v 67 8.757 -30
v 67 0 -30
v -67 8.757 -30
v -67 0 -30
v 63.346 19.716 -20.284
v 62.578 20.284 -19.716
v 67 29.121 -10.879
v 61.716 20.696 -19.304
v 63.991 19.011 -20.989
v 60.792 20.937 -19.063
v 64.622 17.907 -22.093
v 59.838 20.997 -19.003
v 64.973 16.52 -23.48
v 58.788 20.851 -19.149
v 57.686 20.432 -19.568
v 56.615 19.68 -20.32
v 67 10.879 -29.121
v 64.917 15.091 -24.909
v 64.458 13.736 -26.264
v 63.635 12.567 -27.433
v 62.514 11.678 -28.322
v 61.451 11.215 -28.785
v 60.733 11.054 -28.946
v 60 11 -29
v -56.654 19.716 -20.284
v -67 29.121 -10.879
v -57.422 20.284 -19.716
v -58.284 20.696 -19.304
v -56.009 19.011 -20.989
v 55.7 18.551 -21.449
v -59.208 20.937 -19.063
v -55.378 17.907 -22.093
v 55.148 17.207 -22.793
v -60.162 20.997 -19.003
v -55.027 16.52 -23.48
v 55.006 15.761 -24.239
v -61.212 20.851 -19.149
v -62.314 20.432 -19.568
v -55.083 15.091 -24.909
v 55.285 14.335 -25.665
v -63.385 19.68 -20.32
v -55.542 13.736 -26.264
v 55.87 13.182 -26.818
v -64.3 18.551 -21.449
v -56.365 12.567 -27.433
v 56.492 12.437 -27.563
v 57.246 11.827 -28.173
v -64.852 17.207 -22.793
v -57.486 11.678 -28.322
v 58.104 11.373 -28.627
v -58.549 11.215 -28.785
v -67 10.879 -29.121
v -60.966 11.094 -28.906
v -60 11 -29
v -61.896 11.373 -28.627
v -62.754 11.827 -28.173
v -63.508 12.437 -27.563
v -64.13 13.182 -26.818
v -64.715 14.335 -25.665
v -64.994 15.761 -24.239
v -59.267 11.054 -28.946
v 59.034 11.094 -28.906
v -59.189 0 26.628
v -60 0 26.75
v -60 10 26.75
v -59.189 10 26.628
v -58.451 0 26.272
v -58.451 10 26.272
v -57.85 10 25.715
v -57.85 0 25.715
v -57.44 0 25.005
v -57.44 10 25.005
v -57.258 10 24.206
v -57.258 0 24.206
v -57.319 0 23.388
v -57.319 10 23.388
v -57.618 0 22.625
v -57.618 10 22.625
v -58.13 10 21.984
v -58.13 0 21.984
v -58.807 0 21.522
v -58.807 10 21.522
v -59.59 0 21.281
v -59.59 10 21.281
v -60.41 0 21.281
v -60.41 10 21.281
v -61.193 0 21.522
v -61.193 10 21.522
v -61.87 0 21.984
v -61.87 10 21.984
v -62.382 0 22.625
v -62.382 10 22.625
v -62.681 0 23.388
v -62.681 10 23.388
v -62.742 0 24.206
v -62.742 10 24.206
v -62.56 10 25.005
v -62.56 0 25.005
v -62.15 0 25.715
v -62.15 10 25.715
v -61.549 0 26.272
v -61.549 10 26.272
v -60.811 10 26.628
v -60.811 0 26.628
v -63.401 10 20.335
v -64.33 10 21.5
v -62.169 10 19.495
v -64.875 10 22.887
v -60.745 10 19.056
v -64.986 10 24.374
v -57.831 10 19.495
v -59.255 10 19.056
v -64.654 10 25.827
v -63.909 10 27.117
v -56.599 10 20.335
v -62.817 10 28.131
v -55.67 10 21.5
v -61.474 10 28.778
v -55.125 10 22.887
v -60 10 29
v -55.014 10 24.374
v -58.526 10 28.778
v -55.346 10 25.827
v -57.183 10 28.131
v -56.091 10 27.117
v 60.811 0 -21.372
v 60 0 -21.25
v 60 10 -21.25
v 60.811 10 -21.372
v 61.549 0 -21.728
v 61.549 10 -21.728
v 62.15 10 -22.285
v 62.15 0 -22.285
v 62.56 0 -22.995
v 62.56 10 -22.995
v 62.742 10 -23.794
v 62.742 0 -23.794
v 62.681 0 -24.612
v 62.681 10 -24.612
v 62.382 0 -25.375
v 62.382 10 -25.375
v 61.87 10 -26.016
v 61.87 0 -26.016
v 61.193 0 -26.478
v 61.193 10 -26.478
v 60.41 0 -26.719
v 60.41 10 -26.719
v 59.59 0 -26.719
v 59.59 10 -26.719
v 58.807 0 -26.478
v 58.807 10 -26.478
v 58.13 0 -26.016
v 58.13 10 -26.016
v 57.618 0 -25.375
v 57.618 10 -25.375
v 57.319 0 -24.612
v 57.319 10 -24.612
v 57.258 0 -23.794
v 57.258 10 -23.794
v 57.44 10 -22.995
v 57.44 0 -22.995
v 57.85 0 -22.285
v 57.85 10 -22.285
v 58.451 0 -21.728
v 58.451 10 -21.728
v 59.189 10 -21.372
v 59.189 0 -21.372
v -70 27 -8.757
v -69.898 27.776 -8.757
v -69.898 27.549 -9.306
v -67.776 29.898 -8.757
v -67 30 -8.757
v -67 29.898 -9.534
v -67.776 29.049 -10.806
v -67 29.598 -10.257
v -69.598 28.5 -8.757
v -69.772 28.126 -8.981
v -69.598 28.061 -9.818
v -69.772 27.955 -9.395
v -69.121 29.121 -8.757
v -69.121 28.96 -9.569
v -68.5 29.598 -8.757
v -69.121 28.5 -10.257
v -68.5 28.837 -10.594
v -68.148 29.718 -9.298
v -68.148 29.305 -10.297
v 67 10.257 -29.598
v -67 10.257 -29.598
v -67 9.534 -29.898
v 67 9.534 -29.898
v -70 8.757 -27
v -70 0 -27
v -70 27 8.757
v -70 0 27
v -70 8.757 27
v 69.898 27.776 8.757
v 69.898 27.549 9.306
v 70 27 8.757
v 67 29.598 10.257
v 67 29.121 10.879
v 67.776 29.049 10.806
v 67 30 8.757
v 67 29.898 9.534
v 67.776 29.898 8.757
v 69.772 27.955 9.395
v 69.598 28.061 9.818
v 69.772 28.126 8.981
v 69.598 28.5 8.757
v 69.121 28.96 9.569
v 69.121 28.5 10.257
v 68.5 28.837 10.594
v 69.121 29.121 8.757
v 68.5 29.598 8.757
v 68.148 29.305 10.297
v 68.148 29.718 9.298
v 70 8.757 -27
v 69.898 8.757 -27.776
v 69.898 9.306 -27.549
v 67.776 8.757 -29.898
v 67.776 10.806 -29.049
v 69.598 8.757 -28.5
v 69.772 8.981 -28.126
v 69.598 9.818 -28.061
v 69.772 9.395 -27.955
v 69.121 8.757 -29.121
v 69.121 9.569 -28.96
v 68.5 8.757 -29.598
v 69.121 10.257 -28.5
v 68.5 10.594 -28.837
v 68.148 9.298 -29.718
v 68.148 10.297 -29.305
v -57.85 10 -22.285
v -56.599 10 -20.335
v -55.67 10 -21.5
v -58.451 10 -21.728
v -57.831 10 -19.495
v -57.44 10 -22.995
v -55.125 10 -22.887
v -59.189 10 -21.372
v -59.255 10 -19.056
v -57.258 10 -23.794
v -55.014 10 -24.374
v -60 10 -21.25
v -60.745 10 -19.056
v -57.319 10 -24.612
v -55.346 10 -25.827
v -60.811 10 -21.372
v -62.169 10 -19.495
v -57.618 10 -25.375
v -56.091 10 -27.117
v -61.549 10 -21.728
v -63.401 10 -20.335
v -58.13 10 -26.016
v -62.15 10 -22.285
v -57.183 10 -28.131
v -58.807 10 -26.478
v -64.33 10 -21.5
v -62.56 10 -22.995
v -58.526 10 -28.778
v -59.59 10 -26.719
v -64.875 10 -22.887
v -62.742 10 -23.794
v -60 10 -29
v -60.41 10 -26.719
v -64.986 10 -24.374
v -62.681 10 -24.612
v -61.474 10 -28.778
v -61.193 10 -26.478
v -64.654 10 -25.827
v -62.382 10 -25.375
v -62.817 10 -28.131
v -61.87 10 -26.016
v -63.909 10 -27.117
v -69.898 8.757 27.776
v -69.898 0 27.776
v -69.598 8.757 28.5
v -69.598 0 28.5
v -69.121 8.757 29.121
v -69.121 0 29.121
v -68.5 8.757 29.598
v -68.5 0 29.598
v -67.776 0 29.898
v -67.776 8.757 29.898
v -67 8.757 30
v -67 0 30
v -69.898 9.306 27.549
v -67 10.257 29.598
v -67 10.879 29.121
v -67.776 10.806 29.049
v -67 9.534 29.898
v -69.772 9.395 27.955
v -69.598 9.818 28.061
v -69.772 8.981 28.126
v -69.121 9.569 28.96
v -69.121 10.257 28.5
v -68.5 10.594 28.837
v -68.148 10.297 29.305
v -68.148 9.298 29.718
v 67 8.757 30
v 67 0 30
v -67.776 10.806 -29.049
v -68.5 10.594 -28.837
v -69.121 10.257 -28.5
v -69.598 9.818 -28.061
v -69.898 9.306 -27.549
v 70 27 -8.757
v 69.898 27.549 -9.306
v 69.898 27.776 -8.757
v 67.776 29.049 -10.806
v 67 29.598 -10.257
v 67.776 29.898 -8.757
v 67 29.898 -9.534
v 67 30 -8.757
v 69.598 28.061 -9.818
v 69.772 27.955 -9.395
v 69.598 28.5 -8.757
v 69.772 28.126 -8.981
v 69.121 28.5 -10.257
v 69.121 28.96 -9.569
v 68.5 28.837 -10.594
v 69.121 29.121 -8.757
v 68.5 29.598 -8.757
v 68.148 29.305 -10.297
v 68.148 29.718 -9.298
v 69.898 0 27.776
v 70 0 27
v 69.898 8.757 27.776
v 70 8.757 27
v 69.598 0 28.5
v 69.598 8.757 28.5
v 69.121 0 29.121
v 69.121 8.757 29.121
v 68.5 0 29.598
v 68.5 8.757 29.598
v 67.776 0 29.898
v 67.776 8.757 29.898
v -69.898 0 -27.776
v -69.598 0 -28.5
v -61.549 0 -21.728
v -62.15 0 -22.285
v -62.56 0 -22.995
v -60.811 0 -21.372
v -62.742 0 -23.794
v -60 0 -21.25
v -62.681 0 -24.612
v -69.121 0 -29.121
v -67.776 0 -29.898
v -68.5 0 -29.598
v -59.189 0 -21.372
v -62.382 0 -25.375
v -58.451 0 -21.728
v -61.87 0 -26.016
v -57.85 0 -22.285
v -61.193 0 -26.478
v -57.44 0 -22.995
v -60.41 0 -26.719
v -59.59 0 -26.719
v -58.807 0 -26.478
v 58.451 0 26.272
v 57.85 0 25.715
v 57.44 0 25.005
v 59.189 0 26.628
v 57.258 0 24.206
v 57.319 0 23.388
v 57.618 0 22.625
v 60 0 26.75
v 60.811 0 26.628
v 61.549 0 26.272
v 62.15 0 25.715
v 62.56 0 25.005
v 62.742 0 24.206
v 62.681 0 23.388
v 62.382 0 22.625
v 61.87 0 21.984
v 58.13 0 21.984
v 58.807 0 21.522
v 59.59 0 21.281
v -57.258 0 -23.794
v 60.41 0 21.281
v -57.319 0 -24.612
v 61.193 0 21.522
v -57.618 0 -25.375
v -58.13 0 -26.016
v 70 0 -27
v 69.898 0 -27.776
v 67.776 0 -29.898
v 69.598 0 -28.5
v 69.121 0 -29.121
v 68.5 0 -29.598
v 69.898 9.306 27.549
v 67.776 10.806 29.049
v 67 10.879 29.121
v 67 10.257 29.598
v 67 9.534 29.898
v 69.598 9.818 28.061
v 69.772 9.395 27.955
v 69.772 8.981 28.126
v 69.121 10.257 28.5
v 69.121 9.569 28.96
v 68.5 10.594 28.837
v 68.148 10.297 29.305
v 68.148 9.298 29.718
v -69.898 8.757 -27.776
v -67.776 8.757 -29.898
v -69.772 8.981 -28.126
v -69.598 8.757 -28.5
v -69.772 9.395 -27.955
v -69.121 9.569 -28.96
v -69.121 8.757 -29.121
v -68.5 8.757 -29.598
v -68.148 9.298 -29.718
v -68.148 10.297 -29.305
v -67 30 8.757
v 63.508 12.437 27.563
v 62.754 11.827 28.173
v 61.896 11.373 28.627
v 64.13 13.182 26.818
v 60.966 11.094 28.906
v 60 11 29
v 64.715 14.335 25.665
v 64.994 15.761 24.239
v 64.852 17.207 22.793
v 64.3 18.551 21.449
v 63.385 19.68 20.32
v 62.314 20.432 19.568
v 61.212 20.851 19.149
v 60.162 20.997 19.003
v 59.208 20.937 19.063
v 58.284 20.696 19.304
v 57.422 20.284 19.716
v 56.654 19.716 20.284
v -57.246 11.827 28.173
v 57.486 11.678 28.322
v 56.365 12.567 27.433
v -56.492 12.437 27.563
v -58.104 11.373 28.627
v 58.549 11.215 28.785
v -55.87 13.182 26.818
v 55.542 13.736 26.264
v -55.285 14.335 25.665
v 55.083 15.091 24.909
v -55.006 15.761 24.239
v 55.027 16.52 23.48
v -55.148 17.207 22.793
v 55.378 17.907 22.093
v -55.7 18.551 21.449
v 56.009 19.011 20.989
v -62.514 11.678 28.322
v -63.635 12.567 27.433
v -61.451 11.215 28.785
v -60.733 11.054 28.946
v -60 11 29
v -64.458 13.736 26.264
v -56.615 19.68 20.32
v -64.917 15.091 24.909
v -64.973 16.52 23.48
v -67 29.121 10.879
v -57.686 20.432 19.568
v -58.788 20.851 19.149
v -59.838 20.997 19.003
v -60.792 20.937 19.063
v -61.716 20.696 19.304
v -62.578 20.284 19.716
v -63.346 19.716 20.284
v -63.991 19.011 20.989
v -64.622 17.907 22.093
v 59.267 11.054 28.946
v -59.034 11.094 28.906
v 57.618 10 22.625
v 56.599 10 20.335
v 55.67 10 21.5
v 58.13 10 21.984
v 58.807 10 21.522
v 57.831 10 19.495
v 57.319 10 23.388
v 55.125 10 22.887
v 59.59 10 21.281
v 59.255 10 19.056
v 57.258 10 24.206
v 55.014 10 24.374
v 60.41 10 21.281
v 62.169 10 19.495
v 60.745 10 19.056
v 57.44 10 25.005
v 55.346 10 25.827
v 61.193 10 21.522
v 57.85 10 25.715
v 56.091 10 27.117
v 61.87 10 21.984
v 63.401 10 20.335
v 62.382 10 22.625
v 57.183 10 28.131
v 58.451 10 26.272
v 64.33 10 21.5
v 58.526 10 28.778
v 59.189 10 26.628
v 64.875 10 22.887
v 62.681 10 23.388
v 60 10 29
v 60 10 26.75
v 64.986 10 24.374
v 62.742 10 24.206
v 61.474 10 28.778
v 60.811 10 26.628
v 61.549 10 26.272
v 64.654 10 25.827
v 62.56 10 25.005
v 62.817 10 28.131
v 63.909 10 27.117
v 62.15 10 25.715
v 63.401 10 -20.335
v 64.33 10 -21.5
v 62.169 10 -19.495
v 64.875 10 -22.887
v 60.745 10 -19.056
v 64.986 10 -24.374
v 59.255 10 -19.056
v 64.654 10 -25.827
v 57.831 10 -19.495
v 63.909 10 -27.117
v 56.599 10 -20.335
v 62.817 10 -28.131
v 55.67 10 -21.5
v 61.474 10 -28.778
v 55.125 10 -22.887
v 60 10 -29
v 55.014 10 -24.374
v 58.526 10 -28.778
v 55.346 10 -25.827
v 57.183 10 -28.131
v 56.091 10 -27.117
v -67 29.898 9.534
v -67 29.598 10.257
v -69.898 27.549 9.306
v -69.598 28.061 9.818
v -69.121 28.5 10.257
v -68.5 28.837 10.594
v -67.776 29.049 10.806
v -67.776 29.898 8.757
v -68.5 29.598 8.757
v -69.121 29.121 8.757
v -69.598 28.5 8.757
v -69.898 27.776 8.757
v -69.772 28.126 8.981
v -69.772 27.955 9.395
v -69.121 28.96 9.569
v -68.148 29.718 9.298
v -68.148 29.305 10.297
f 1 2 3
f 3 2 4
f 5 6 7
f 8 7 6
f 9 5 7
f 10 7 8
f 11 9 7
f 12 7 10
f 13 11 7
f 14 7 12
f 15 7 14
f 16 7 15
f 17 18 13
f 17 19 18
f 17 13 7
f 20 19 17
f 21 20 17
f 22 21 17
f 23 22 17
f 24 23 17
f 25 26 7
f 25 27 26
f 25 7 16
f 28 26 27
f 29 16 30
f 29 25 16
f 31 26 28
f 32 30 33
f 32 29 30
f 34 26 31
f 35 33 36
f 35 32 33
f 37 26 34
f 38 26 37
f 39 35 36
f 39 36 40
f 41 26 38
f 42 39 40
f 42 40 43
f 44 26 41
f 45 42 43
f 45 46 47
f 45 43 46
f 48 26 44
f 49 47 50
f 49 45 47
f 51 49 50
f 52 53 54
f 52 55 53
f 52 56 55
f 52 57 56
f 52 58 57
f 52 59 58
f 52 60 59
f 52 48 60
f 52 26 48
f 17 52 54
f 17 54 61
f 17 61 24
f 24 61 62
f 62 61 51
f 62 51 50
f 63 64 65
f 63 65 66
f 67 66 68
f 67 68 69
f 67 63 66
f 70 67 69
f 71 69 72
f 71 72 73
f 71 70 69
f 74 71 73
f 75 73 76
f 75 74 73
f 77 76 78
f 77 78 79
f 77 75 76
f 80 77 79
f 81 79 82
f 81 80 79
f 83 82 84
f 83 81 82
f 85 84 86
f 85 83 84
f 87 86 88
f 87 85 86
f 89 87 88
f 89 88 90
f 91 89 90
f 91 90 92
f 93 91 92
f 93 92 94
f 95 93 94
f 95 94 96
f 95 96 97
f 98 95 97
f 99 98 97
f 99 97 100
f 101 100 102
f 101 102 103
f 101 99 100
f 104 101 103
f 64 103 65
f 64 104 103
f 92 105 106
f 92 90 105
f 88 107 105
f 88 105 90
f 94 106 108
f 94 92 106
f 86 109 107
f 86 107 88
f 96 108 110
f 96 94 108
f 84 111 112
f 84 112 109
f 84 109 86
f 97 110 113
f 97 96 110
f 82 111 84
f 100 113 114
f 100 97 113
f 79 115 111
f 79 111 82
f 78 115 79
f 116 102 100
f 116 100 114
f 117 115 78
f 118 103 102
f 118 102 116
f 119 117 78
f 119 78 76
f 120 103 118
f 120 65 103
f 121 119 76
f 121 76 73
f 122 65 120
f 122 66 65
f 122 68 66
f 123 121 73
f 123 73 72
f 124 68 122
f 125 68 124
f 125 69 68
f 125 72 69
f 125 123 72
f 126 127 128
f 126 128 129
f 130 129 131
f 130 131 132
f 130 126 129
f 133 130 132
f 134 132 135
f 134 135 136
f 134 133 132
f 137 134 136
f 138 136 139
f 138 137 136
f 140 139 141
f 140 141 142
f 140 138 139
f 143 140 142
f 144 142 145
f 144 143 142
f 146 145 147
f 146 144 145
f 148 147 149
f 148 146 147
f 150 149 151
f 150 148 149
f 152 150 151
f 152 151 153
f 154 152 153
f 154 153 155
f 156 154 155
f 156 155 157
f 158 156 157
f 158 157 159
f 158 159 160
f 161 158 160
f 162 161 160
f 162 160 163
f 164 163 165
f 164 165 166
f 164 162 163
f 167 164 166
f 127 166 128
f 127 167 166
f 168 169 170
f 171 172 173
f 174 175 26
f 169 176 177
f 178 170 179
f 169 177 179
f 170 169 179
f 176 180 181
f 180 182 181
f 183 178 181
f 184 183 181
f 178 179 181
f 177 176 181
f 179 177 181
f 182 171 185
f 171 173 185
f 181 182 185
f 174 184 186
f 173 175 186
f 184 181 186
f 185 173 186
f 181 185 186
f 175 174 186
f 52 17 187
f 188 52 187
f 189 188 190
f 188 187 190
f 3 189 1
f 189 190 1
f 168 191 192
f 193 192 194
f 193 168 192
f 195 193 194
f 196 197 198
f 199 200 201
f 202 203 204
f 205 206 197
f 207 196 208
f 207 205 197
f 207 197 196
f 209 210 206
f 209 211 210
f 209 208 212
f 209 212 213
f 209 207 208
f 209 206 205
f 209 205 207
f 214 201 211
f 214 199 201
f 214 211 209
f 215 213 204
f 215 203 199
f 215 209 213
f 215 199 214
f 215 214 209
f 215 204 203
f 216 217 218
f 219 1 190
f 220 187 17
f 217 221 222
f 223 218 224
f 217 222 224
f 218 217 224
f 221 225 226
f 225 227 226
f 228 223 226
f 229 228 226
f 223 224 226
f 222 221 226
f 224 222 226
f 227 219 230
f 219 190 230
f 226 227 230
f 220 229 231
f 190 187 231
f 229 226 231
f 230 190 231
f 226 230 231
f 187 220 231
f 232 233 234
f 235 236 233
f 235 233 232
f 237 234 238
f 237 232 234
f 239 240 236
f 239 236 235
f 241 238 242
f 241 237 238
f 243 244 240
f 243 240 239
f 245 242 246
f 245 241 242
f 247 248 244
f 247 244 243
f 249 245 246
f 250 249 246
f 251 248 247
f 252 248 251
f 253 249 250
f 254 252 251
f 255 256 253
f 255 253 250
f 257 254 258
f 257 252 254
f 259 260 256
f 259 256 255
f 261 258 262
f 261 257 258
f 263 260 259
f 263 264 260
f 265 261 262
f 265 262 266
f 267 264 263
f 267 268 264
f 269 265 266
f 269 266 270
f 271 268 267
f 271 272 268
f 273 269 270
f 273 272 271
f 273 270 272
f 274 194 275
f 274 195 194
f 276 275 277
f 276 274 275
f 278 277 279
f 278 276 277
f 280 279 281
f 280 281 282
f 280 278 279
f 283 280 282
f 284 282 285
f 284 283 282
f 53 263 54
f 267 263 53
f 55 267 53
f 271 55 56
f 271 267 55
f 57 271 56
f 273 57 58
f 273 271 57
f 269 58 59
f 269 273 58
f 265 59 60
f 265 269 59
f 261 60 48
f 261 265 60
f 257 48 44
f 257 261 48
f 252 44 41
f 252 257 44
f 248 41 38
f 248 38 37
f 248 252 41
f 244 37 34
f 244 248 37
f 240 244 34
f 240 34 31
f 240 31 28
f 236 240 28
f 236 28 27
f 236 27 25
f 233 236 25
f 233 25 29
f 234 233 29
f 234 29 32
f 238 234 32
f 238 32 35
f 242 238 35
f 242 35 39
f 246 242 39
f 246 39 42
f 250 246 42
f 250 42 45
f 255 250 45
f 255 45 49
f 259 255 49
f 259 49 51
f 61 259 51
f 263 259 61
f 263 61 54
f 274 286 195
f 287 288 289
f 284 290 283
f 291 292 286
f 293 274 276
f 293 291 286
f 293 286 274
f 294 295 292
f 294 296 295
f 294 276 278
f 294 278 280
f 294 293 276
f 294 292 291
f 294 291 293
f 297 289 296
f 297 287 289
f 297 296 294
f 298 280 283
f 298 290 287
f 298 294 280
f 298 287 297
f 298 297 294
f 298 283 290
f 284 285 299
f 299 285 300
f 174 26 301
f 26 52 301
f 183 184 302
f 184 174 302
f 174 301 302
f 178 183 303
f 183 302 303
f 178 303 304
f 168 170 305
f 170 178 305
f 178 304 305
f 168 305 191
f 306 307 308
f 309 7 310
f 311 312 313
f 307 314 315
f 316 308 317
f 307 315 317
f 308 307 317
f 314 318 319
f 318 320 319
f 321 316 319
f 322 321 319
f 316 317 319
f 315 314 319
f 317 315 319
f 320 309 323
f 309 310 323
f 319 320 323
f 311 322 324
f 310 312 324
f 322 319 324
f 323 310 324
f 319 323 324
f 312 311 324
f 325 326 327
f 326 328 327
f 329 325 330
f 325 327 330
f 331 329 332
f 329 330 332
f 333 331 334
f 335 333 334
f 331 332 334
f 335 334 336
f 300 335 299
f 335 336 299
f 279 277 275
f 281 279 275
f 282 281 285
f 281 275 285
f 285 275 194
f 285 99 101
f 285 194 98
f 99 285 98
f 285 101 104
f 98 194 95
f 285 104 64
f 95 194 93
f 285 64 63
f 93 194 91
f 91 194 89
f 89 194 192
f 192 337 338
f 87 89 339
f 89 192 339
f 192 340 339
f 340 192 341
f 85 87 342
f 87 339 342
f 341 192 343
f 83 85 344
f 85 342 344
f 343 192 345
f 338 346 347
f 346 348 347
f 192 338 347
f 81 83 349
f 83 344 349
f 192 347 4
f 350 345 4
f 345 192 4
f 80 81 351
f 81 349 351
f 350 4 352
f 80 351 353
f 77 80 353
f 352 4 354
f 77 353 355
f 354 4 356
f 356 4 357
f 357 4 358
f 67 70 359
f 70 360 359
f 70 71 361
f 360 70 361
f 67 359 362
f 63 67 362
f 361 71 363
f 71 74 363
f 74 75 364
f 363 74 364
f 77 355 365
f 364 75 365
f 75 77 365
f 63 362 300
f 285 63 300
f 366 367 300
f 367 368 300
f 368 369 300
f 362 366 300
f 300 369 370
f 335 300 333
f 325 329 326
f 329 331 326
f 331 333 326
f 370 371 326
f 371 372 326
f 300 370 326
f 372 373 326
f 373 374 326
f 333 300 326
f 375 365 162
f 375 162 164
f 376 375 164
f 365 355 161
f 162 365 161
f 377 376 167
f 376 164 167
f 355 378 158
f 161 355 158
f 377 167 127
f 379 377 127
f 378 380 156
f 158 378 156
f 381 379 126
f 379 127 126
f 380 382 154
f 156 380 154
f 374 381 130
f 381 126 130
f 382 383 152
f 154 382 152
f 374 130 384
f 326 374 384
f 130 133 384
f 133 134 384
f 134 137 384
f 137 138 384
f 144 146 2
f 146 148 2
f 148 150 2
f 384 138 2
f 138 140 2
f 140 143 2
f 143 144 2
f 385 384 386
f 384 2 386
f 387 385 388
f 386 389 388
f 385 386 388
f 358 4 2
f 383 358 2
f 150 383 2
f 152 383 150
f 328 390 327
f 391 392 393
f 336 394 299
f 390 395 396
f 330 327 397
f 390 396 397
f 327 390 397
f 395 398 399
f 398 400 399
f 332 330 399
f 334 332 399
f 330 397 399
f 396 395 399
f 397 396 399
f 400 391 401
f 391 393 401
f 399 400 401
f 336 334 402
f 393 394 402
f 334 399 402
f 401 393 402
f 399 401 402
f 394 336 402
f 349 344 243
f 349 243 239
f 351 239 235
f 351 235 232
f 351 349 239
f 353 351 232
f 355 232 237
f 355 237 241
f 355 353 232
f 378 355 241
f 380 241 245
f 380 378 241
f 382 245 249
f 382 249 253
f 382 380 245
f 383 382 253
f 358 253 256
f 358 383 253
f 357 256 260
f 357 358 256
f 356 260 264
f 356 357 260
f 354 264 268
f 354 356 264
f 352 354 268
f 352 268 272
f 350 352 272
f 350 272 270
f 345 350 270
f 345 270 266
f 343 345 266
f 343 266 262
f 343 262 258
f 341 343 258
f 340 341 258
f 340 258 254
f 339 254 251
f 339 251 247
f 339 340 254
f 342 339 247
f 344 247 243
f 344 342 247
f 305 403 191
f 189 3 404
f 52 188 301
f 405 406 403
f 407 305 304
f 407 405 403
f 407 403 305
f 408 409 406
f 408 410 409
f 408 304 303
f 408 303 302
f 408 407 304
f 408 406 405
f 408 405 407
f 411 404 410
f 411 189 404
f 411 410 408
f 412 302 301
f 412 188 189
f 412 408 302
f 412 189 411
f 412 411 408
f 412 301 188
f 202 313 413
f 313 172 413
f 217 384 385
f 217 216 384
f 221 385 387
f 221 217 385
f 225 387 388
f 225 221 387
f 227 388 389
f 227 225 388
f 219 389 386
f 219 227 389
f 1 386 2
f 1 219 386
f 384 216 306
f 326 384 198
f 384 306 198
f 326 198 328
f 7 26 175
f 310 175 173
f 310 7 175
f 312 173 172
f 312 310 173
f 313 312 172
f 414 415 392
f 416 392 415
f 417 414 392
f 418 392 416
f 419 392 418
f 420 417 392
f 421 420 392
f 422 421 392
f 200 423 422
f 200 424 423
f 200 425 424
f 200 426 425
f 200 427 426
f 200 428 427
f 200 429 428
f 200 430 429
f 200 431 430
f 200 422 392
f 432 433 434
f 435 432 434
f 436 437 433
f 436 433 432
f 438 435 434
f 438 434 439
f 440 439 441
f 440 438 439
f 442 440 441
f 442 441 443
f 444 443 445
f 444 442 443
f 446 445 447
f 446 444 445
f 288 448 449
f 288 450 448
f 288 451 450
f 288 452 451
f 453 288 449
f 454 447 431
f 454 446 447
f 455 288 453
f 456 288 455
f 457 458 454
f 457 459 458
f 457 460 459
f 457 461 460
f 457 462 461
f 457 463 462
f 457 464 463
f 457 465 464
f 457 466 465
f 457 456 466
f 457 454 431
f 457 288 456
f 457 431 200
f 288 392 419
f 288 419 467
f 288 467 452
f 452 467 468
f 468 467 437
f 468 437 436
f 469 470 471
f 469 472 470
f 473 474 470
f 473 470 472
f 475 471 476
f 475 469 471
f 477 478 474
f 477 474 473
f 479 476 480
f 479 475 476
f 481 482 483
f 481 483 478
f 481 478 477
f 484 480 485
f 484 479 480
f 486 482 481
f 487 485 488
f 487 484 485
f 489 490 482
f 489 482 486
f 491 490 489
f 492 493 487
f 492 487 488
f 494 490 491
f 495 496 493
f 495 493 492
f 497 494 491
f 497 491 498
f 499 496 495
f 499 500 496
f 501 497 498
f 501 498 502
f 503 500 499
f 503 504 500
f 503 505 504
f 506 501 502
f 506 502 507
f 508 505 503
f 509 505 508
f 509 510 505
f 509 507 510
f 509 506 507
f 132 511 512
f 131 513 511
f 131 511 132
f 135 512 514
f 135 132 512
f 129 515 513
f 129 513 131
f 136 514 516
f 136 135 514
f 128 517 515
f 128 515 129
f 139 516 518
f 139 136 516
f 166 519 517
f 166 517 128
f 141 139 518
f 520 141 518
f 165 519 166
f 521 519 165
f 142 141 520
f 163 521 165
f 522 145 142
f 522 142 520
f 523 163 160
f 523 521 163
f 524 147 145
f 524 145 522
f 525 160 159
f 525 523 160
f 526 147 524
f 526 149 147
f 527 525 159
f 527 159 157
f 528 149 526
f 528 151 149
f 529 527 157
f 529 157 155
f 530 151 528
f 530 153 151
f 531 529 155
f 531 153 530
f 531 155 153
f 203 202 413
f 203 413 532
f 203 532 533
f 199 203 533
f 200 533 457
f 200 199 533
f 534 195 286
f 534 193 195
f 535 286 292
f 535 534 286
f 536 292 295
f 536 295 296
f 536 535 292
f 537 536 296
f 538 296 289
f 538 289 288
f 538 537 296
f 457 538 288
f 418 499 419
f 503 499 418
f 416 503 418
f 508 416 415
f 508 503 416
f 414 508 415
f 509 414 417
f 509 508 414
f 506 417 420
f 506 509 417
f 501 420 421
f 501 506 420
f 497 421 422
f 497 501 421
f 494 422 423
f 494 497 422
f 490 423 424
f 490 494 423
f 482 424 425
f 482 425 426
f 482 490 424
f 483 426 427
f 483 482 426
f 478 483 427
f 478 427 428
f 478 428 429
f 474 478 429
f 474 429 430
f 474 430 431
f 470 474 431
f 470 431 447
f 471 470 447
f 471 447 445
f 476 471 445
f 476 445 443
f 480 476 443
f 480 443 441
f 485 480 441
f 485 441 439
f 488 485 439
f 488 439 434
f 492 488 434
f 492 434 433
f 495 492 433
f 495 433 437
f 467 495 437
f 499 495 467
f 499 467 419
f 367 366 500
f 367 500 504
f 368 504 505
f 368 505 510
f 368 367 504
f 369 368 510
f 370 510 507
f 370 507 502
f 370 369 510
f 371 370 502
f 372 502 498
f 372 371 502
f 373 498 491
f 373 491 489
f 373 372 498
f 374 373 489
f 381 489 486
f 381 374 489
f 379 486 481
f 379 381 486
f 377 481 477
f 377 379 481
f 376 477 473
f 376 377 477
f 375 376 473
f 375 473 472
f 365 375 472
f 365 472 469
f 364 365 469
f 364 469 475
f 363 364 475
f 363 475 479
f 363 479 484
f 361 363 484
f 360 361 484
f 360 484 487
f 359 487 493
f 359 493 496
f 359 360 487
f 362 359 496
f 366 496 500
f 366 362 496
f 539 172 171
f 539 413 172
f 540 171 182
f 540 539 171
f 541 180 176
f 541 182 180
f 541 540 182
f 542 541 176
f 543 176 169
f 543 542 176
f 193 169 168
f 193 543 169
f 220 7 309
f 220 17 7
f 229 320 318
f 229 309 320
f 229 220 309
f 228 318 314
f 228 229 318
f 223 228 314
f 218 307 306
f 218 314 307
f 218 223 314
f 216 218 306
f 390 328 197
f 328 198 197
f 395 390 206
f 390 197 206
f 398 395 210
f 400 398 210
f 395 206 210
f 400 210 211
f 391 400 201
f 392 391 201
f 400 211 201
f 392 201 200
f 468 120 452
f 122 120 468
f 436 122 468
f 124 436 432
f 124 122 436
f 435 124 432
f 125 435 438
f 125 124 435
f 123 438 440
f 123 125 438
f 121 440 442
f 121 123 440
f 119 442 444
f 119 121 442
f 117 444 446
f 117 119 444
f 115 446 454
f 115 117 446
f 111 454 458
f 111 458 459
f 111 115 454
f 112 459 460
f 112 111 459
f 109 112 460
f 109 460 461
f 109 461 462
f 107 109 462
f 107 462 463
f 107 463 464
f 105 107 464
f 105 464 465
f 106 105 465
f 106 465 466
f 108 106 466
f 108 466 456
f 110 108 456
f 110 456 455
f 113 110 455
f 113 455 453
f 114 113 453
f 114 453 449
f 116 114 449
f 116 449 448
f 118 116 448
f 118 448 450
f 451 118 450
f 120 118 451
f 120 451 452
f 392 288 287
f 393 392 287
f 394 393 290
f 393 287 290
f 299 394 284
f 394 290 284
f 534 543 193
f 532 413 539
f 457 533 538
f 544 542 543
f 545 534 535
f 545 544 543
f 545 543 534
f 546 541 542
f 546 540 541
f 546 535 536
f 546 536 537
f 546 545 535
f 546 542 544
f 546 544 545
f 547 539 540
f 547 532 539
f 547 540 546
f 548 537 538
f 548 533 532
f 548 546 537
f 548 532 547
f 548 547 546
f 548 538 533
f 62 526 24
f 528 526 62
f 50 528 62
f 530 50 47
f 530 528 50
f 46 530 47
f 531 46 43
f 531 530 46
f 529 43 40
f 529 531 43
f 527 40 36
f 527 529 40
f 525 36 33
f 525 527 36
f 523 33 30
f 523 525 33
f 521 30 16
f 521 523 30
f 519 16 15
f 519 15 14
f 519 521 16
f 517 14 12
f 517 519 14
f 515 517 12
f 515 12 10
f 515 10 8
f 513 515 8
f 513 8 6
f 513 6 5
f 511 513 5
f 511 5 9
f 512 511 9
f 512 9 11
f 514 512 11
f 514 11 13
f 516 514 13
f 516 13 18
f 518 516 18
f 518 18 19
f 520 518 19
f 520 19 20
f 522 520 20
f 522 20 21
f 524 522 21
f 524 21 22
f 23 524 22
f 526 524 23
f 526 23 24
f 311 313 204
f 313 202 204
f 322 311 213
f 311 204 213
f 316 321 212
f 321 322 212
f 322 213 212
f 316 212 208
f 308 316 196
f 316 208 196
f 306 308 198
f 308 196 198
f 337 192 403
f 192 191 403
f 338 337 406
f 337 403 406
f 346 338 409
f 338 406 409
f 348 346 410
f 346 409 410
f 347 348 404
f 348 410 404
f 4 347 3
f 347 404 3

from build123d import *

# Parameters (mm, degrees)
SKETCH1_R           = 2.75
SKETCH1_W           = 130
SKETCH1_H           = 38
BOSS_EXTRUDE1_DEPTH = 10
SKETCH2_W           = 20
SKETCH2_H           = 20
BOSS_EXTRUDE3_DEPTH = 140
SKETCH3_R           = 5
CUT_EXTRUDE1_DEPTH  = 79.74007874
FILLET1_R           = 3


with BuildPart() as part:
    # Sketch1 → Boss-Extrude1 (new body)
    # profile 1 of 6: a face of its own
    with BuildSketch(Plane(origin=(0, 0, 0), x_dir=(1, 0, 0), z_dir=(0, 1, 0))):
        with BuildLine():
            Line((70, 30), (67, 30))
            ThreePointArc((67, 30), (69.121320344, 29.121320344), (70, 27))
            Line((70, 27), (70, 30))
        make_face()
    # profile 2 of 6: a face of its own
    with BuildSketch(Plane(origin=(0, 0, 0), x_dir=(1, 0, 0), z_dir=(0, 1, 0))):
        with BuildLine():
            ThreePointArc((70, 27), (69.121320344, 29.121320344), (67, 30))
            Line((67, 30), (-67, 30))
            ThreePointArc((-67, 30), (-69.121320344, 29.121320344), (-70, 27))
            Line((-70, 27), (-70, -27))
            ThreePointArc((-70, -27), (-69.121320344, -29.121320344), (-67, -30))
            Line((-67, -30), (67, -30))
            ThreePointArc((67, -30), (69.121320344, -29.121320344), (70, -27))
            Line((70, -27), (70, 27))
        make_face()
        with Locations(Location((-60, -24, 0), (0, 0, 270))):
            Circle(SKETCH1_R, mode=Mode.SUBTRACT)
        with Locations(Location((60, 24, 0), (0, 0, 270))):
            Circle(SKETCH1_R, mode=Mode.SUBTRACT)
        with Locations(Location((60, -24, 0), (0, 0, 270))):
            Circle(SKETCH1_R, mode=Mode.SUBTRACT)
        with Locations(Location((-60, 24, 0), (0, 0, 270))):
            Circle(SKETCH1_R, mode=Mode.SUBTRACT)
        Rectangle(SKETCH1_W, SKETCH1_H, mode=Mode.SUBTRACT)
    # profile 3 of 6: a face of its own
    with BuildSketch(Plane(origin=(0, 0, 0), x_dir=(1, 0, 0), z_dir=(0, 1, 0))):
        with BuildLine():
            Line((70, -30), (70, -27))
            ThreePointArc((70, -27), (69.121320344, -29.121320344), (67, -30))
            Line((67, -30), (70, -30))
        make_face()
    # profile 4 of 6: a face of its own
    with BuildSketch(Plane(origin=(0, 0, 0), x_dir=(1, 0, 0), z_dir=(0, 1, 0))):
        with BuildLine():
            ThreePointArc((-70, 27), (-69.121320344, 29.121320344), (-67, 30))
            Line((-67, 30), (-70, 30))
            Line((-70, 30), (-70, 27))
        make_face()
    # profile 5 of 6: a face of its own
    with BuildSketch(Plane(origin=(0, 0, 0), x_dir=(1, 0, 0), z_dir=(0, 1, 0))):
        with BuildLine():
            ThreePointArc((-67, -30), (-69.121320344, -29.121320344), (-70, -27))
            Line((-70, -27), (-70, -30))
            Line((-70, -30), (-67, -30))
        make_face()
    # profile 6 of 6: a face of its own
    with BuildSketch(Plane(origin=(0, 0, 0), x_dir=(1, 0, 0), z_dir=(0, 1, 0))):
        Rectangle(SKETCH1_W, SKETCH1_H)
    extrude(amount=BOSS_EXTRUDE1_DEPTH)

    # Sketch2 → Boss-Extrude3 (add, through all)
    with BuildSketch(Plane.ZY.offset(70)):
        Polygon((-10, 10), (-10, 30), (-30, 10), align=None)
        with Locations((0, 20)):
            Rectangle(SKETCH2_W, SKETCH2_H)
        Polygon((30, 10), (10, 30), (10, 10), align=None)
    extrude(amount=-BOSS_EXTRUDE3_DEPTH)

    # Sketch3 → Cut-Extrude1 (cut, through all)
    with BuildSketch(Plane(origin=(0, 10, 0), x_dir=(1, 0, 0), z_dir=(0, 1, 0))):
        with Locations(Location((60, 24, 0), (0, 0, 90))):
            Circle(SKETCH3_R)
        with Locations(Location((60, -24, 0), (0, 0, 270))):
            Circle(SKETCH3_R)
        with Locations(Location((-60, 24, 0), (0, 0, 90))):
            Circle(SKETCH3_R)
        with Locations(Location((-60, -24, 0), (0, 0, 270))):
            Circle(SKETCH3_R)
    extrude(amount=CUT_EXTRUDE1_DEPTH, mode=Mode.SUBTRACT)

    # Fillet1
    fillet1_edges = [part.edges().sort_by_distance(p)[0] for p in [
        (0, 10, -30),
        (70, 5, 30),
        (-70, 5, 30),
        (-70, 5, -30),
        (70, 5, -30),
        (0, 10, 30),
        (-70, 20, -20),
        (70, 30, 0),
        (0, 30, -10),
        (-70, 20, 20),
        (0, 30, 10),
        (70, 20, -20),
        (70, 20, 20),
        (-70, 30, 0),
    ]]
    fillet(fillet1_edges, radius=FILLET1_R)


solid = part.part
